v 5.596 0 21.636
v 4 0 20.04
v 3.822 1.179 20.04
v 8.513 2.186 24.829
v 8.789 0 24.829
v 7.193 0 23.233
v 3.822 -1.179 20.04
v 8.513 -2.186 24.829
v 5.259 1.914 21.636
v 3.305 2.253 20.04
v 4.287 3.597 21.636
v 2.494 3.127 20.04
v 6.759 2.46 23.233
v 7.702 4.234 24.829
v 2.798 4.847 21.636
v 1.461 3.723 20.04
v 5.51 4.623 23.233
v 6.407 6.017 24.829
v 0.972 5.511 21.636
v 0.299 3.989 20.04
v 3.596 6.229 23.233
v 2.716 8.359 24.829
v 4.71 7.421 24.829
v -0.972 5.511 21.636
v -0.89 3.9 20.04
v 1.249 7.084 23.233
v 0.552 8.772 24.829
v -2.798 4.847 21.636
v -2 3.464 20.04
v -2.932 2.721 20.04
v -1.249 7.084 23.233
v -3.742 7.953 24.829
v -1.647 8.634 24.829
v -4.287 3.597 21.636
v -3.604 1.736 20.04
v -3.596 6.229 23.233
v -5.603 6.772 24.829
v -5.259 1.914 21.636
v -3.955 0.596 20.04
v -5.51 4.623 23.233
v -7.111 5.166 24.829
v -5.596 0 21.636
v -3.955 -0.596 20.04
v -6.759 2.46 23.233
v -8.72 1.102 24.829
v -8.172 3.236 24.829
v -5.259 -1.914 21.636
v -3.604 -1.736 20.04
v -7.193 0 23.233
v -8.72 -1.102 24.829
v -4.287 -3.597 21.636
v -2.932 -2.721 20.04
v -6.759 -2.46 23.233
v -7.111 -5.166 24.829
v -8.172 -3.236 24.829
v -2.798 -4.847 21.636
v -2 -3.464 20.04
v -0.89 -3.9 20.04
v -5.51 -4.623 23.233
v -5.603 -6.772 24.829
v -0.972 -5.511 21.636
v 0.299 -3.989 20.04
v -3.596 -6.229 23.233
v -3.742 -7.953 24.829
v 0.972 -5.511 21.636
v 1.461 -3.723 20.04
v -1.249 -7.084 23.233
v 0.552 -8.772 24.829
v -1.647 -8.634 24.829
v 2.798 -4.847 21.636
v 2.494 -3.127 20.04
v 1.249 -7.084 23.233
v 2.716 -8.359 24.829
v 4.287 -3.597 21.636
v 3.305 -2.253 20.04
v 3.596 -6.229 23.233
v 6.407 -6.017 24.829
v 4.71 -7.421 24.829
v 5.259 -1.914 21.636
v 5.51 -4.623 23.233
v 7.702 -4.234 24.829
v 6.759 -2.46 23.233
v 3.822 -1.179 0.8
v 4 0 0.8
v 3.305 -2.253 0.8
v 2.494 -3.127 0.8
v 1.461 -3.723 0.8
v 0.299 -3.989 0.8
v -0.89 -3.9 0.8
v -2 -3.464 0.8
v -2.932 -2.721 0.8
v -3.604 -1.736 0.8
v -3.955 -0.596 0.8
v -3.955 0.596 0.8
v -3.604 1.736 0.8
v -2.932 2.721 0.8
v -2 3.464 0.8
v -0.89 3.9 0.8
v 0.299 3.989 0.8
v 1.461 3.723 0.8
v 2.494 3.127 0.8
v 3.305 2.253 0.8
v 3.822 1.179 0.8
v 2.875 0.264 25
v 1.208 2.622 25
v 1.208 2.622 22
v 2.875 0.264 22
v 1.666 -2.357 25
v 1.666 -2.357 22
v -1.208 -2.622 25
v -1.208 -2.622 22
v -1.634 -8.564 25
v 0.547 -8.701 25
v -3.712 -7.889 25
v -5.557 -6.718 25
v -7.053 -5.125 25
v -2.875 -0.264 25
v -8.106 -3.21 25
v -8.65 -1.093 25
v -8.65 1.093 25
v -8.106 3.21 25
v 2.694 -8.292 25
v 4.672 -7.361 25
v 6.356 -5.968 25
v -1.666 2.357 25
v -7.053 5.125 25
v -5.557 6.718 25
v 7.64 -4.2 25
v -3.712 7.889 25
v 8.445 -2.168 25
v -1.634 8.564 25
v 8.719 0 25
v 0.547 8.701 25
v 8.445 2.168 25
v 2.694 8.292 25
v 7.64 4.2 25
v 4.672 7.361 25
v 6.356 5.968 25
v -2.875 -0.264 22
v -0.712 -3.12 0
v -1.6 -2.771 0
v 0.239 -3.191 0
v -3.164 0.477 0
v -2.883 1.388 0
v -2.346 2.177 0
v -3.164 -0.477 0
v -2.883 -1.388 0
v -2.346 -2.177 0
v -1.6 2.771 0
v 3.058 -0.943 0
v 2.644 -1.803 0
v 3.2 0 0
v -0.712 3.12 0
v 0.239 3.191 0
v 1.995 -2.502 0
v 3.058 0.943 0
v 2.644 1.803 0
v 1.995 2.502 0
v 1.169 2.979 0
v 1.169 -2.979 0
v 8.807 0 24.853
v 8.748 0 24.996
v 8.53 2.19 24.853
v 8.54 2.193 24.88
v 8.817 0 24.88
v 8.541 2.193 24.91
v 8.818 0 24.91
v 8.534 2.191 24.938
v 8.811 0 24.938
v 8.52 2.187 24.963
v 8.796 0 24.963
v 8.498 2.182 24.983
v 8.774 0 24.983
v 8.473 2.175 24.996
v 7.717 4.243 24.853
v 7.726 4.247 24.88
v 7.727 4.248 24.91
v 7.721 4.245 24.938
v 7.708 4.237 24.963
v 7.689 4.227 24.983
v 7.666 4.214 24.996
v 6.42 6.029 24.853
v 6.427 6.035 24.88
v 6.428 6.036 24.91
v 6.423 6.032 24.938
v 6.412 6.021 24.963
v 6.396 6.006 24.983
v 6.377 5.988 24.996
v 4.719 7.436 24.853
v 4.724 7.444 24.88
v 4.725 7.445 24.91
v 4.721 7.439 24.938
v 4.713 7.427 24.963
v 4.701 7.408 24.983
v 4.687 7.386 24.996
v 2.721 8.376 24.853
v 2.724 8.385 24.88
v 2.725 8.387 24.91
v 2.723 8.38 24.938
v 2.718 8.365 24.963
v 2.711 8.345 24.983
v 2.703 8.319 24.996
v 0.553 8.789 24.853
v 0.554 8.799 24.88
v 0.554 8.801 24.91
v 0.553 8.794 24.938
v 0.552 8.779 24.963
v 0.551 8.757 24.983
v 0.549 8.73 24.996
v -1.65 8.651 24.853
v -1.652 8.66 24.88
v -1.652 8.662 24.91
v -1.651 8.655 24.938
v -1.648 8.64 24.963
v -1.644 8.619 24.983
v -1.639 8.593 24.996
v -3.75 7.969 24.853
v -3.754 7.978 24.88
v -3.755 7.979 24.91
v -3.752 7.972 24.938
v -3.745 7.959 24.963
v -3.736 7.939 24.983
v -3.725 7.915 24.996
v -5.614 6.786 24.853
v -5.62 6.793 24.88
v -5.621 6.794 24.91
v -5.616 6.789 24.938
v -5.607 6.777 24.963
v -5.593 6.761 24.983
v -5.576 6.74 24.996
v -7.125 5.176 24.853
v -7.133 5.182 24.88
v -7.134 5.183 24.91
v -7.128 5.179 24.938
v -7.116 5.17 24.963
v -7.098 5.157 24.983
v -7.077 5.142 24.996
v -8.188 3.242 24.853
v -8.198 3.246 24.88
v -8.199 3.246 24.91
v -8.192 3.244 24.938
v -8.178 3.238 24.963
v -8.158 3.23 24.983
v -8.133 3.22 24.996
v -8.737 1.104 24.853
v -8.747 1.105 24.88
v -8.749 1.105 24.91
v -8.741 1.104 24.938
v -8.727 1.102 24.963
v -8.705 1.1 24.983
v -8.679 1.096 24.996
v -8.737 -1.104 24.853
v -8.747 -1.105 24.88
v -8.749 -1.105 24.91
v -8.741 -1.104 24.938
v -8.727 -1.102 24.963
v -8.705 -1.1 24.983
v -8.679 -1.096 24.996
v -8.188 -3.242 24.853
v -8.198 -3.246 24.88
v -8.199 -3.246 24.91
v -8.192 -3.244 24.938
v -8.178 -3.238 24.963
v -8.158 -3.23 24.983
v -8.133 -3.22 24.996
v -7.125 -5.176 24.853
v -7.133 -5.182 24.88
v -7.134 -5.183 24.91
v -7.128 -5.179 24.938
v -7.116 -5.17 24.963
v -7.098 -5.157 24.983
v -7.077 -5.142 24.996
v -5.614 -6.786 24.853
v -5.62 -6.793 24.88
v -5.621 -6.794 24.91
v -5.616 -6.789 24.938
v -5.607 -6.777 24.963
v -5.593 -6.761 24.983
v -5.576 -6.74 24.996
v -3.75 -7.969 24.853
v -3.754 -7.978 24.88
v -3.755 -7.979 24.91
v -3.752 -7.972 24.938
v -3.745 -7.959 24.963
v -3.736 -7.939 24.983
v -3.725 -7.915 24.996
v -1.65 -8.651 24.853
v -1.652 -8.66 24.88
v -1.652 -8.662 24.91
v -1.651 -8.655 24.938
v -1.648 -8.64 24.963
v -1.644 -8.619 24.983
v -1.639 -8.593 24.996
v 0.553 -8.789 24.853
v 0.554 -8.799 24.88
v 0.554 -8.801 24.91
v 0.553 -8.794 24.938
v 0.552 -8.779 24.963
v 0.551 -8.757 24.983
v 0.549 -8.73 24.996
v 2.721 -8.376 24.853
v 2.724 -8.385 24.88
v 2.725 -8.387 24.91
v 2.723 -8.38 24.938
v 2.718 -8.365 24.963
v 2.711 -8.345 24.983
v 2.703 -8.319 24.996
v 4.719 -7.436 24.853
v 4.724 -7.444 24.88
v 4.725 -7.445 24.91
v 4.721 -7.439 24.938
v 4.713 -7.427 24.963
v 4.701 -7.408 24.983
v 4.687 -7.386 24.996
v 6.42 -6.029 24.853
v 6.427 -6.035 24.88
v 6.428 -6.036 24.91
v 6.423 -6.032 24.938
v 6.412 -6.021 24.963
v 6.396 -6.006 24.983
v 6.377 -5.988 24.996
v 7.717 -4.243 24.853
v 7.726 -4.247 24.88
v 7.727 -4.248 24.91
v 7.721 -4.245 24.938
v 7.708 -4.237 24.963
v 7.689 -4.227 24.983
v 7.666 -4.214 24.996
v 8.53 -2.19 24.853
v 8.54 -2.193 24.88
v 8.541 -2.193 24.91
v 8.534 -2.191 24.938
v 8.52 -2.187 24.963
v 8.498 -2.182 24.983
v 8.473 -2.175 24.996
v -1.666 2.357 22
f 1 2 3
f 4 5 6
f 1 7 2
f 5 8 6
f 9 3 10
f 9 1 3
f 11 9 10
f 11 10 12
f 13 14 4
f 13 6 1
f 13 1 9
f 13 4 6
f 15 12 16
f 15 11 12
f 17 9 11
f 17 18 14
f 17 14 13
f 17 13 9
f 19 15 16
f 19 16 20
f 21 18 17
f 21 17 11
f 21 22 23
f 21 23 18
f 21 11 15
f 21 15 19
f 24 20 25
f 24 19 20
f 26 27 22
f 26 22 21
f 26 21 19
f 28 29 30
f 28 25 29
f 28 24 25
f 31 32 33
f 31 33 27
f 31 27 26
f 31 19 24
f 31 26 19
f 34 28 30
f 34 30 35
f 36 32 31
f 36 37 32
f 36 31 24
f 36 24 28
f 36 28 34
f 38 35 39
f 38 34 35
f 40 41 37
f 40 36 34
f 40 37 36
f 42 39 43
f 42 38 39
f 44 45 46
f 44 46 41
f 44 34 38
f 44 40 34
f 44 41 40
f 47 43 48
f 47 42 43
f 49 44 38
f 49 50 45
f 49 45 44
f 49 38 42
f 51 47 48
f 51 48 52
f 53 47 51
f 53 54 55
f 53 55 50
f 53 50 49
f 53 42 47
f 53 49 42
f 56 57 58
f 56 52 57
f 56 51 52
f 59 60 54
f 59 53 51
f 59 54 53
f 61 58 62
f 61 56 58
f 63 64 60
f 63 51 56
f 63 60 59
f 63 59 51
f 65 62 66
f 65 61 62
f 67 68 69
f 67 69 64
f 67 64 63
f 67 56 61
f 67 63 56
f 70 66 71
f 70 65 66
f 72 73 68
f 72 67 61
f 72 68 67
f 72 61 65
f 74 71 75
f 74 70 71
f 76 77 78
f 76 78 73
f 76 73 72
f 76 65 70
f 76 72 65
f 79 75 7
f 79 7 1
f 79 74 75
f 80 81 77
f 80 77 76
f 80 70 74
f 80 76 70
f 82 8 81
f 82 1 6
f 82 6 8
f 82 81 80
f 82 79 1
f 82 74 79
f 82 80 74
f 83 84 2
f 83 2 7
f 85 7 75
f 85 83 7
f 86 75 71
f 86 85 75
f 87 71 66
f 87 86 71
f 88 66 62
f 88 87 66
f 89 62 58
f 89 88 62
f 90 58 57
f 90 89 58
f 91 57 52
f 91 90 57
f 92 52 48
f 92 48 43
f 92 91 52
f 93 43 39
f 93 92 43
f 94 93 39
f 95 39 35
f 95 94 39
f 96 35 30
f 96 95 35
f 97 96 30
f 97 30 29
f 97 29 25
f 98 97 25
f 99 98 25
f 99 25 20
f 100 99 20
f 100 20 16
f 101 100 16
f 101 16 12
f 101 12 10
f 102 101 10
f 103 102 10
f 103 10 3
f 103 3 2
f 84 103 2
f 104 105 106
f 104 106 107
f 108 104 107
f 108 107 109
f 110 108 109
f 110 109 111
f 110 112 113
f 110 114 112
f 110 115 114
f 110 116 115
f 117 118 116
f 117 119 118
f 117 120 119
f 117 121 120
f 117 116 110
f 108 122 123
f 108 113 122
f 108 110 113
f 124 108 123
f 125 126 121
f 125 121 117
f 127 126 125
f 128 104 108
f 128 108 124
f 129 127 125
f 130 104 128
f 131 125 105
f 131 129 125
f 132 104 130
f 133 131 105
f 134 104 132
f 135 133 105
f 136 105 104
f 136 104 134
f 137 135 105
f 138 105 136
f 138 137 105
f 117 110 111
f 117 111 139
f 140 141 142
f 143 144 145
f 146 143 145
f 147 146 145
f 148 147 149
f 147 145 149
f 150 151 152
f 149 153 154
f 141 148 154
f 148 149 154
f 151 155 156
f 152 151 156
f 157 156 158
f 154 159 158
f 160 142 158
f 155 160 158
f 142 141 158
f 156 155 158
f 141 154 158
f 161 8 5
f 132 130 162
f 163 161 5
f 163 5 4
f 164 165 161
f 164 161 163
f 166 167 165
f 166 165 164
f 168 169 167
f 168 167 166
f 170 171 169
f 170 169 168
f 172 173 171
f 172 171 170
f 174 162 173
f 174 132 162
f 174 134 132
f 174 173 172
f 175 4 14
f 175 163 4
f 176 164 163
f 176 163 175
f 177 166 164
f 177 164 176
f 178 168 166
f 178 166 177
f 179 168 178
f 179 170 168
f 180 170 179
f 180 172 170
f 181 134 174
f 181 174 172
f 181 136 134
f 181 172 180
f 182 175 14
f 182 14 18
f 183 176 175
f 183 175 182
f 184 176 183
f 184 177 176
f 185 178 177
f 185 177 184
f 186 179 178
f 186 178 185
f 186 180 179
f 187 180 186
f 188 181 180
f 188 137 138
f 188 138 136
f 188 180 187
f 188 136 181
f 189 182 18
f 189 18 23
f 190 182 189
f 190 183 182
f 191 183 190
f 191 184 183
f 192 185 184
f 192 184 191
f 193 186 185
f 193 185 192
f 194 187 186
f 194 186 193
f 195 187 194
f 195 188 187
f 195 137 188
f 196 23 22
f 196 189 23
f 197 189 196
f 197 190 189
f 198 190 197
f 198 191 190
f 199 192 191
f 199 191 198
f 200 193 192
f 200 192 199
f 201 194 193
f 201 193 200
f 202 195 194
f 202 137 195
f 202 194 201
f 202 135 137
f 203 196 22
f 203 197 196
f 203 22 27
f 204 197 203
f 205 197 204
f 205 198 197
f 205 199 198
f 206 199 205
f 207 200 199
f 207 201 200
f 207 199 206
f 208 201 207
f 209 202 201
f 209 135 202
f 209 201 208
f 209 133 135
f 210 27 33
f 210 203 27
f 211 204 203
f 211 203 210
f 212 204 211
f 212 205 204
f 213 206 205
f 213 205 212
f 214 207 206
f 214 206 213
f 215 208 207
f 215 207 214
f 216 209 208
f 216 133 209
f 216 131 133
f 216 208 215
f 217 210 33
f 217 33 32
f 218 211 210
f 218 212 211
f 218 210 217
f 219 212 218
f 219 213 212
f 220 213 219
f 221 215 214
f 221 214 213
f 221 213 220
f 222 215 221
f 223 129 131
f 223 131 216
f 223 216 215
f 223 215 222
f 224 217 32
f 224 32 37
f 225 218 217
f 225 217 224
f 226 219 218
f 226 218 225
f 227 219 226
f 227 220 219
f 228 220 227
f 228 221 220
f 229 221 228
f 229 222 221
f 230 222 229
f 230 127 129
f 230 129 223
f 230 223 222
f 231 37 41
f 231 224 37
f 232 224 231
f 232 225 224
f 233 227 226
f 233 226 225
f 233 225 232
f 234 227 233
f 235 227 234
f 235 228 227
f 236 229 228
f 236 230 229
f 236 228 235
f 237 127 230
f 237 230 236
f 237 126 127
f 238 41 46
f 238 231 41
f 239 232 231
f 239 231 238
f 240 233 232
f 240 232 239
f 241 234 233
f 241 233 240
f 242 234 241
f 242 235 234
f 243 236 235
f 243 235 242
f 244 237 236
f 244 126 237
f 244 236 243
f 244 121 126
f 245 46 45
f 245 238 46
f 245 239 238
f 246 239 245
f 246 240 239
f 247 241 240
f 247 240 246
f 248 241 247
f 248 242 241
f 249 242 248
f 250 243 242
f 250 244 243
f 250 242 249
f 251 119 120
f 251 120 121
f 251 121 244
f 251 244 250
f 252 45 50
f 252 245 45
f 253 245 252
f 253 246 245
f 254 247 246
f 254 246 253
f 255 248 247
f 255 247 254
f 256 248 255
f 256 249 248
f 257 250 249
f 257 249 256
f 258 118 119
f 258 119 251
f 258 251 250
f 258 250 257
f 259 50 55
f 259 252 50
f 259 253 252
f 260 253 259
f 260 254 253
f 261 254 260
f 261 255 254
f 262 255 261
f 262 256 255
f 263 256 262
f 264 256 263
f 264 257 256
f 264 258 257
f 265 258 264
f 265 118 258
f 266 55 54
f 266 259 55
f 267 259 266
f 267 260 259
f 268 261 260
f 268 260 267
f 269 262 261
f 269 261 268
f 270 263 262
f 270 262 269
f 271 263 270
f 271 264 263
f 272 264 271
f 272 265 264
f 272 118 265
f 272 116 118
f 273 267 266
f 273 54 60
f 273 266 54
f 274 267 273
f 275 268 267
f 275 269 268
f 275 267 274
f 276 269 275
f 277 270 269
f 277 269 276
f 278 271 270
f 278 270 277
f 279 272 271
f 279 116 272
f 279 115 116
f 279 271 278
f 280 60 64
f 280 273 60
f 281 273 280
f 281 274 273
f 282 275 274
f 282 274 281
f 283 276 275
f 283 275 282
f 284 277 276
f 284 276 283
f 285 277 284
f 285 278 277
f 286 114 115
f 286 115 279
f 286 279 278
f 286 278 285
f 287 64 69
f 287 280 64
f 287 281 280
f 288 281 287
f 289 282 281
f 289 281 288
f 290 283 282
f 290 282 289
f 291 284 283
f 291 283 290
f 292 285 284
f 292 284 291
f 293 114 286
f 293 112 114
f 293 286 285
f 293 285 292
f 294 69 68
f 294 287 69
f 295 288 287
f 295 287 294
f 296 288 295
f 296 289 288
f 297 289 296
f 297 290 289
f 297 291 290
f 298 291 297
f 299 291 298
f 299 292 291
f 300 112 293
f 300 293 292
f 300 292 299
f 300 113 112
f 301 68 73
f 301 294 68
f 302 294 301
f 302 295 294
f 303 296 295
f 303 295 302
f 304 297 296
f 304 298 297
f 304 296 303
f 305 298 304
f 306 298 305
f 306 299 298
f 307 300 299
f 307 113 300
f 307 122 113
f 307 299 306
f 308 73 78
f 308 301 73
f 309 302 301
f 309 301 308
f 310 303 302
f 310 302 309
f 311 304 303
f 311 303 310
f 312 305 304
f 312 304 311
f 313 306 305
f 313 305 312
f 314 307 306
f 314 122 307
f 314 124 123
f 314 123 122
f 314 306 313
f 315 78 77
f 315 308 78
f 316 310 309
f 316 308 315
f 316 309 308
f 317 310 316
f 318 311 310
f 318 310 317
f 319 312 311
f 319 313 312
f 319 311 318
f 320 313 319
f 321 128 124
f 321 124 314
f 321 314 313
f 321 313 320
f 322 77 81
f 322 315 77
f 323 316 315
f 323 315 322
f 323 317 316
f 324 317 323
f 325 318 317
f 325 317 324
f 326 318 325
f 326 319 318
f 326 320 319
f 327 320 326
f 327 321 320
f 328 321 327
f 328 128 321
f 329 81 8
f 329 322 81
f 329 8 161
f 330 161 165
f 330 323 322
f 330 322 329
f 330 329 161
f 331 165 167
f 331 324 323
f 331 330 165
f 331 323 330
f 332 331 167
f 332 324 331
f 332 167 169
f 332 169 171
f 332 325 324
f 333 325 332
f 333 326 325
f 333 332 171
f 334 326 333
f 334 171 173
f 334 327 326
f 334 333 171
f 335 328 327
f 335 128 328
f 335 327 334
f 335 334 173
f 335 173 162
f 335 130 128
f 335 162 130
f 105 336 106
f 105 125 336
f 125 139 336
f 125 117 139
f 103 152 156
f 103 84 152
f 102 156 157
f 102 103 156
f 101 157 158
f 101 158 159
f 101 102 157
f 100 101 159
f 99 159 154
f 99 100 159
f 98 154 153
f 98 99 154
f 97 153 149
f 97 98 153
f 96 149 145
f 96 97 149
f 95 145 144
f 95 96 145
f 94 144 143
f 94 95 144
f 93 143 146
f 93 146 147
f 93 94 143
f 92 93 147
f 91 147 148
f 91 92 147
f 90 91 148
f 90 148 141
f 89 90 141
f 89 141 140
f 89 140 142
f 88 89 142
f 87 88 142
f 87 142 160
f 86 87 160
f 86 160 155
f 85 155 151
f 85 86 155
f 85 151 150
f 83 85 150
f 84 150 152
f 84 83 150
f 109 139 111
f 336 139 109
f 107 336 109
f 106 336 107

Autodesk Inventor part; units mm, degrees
ref_plane "YZ Plane" through (0, 0, 0) normal (1, 0, 0) x (0, 1, 0)
ref_plane "XZ Plane" through (0, 0, 0) normal (0, 1, 0) x (-1, 0, 0)
ref_plane "XY Plane" through (0, 0, 0) normal (0, 0, 1) x (1, 0, 0)
sketch "Sketch1" plane through (0, 0, 0) normal (0, 0, 1) x (1, 0, 0)
  circle A0 centre (0, 0) radius 4
  dimension "Diameter" = 8
extrude "Extrusion1" add sketch "Sketch1" along normal blind 20.04
sketch "Sketch2" plane through (0, 0, 20.04) normal (0, 0, 1) x (1, 0, 0)
  circle A0 centre (0, 0) radius 4 projected
extrude "Extrusion2" add sketch "Sketch2" along normal blind 4.96 draft 45
sketch "Sketch3" plane through (0, 0, 25) normal (0, 0, 1) x (1, 0, 0)
  circle A0 centre (0, 0) radius 8.96 projected
  circle A1 centre (0, 0) radius 2.8868 construction
  line L0 (1.2084, 2.6217) -> (2.8746, 0.2644)
  line L1 (2.8746, 0.2644) -> (1.6662, -2.3573)
  line L2 (1.6662, -2.3573) -> (-1.2084, -2.6217)
  line L3 (-1.2084, -2.6217) -> (-2.8746, -0.2644)
  line L4 (-2.8746, -0.2644) -> (-1.6662, 2.3573)
  line L5 (-1.6662, 2.3573) -> (1.2084, 2.6217)
  dimension "Hex_Width" = 5
extrude "Extrusion3" cut sketch "Sketch3" against normal blind 3 contours L0 L1 L2 L3 L4 L5
thread "Thread1" size "M8x1.25" class "4g6g" standard "ANSI Metric M Profile" length 20.04
chamfer "Chamfer2" distance 0.8 angle 45 1 edges at (-4, 0, 0)
fillet "Fillet1" radius 0.1 1 edges at (-8.96, 0, 25)
equation "\"d10\" = Thread_Length"
equation "\"d13\" = Chamfer"
equation "\"Thread_Length\" = 20.04"
equation "\"Length\" = 25"
equation "\"Chamfer\" = 0.8"
properties part number "SCREW, FLAT HD, P, 12.9, M8X1.25X25MM"
